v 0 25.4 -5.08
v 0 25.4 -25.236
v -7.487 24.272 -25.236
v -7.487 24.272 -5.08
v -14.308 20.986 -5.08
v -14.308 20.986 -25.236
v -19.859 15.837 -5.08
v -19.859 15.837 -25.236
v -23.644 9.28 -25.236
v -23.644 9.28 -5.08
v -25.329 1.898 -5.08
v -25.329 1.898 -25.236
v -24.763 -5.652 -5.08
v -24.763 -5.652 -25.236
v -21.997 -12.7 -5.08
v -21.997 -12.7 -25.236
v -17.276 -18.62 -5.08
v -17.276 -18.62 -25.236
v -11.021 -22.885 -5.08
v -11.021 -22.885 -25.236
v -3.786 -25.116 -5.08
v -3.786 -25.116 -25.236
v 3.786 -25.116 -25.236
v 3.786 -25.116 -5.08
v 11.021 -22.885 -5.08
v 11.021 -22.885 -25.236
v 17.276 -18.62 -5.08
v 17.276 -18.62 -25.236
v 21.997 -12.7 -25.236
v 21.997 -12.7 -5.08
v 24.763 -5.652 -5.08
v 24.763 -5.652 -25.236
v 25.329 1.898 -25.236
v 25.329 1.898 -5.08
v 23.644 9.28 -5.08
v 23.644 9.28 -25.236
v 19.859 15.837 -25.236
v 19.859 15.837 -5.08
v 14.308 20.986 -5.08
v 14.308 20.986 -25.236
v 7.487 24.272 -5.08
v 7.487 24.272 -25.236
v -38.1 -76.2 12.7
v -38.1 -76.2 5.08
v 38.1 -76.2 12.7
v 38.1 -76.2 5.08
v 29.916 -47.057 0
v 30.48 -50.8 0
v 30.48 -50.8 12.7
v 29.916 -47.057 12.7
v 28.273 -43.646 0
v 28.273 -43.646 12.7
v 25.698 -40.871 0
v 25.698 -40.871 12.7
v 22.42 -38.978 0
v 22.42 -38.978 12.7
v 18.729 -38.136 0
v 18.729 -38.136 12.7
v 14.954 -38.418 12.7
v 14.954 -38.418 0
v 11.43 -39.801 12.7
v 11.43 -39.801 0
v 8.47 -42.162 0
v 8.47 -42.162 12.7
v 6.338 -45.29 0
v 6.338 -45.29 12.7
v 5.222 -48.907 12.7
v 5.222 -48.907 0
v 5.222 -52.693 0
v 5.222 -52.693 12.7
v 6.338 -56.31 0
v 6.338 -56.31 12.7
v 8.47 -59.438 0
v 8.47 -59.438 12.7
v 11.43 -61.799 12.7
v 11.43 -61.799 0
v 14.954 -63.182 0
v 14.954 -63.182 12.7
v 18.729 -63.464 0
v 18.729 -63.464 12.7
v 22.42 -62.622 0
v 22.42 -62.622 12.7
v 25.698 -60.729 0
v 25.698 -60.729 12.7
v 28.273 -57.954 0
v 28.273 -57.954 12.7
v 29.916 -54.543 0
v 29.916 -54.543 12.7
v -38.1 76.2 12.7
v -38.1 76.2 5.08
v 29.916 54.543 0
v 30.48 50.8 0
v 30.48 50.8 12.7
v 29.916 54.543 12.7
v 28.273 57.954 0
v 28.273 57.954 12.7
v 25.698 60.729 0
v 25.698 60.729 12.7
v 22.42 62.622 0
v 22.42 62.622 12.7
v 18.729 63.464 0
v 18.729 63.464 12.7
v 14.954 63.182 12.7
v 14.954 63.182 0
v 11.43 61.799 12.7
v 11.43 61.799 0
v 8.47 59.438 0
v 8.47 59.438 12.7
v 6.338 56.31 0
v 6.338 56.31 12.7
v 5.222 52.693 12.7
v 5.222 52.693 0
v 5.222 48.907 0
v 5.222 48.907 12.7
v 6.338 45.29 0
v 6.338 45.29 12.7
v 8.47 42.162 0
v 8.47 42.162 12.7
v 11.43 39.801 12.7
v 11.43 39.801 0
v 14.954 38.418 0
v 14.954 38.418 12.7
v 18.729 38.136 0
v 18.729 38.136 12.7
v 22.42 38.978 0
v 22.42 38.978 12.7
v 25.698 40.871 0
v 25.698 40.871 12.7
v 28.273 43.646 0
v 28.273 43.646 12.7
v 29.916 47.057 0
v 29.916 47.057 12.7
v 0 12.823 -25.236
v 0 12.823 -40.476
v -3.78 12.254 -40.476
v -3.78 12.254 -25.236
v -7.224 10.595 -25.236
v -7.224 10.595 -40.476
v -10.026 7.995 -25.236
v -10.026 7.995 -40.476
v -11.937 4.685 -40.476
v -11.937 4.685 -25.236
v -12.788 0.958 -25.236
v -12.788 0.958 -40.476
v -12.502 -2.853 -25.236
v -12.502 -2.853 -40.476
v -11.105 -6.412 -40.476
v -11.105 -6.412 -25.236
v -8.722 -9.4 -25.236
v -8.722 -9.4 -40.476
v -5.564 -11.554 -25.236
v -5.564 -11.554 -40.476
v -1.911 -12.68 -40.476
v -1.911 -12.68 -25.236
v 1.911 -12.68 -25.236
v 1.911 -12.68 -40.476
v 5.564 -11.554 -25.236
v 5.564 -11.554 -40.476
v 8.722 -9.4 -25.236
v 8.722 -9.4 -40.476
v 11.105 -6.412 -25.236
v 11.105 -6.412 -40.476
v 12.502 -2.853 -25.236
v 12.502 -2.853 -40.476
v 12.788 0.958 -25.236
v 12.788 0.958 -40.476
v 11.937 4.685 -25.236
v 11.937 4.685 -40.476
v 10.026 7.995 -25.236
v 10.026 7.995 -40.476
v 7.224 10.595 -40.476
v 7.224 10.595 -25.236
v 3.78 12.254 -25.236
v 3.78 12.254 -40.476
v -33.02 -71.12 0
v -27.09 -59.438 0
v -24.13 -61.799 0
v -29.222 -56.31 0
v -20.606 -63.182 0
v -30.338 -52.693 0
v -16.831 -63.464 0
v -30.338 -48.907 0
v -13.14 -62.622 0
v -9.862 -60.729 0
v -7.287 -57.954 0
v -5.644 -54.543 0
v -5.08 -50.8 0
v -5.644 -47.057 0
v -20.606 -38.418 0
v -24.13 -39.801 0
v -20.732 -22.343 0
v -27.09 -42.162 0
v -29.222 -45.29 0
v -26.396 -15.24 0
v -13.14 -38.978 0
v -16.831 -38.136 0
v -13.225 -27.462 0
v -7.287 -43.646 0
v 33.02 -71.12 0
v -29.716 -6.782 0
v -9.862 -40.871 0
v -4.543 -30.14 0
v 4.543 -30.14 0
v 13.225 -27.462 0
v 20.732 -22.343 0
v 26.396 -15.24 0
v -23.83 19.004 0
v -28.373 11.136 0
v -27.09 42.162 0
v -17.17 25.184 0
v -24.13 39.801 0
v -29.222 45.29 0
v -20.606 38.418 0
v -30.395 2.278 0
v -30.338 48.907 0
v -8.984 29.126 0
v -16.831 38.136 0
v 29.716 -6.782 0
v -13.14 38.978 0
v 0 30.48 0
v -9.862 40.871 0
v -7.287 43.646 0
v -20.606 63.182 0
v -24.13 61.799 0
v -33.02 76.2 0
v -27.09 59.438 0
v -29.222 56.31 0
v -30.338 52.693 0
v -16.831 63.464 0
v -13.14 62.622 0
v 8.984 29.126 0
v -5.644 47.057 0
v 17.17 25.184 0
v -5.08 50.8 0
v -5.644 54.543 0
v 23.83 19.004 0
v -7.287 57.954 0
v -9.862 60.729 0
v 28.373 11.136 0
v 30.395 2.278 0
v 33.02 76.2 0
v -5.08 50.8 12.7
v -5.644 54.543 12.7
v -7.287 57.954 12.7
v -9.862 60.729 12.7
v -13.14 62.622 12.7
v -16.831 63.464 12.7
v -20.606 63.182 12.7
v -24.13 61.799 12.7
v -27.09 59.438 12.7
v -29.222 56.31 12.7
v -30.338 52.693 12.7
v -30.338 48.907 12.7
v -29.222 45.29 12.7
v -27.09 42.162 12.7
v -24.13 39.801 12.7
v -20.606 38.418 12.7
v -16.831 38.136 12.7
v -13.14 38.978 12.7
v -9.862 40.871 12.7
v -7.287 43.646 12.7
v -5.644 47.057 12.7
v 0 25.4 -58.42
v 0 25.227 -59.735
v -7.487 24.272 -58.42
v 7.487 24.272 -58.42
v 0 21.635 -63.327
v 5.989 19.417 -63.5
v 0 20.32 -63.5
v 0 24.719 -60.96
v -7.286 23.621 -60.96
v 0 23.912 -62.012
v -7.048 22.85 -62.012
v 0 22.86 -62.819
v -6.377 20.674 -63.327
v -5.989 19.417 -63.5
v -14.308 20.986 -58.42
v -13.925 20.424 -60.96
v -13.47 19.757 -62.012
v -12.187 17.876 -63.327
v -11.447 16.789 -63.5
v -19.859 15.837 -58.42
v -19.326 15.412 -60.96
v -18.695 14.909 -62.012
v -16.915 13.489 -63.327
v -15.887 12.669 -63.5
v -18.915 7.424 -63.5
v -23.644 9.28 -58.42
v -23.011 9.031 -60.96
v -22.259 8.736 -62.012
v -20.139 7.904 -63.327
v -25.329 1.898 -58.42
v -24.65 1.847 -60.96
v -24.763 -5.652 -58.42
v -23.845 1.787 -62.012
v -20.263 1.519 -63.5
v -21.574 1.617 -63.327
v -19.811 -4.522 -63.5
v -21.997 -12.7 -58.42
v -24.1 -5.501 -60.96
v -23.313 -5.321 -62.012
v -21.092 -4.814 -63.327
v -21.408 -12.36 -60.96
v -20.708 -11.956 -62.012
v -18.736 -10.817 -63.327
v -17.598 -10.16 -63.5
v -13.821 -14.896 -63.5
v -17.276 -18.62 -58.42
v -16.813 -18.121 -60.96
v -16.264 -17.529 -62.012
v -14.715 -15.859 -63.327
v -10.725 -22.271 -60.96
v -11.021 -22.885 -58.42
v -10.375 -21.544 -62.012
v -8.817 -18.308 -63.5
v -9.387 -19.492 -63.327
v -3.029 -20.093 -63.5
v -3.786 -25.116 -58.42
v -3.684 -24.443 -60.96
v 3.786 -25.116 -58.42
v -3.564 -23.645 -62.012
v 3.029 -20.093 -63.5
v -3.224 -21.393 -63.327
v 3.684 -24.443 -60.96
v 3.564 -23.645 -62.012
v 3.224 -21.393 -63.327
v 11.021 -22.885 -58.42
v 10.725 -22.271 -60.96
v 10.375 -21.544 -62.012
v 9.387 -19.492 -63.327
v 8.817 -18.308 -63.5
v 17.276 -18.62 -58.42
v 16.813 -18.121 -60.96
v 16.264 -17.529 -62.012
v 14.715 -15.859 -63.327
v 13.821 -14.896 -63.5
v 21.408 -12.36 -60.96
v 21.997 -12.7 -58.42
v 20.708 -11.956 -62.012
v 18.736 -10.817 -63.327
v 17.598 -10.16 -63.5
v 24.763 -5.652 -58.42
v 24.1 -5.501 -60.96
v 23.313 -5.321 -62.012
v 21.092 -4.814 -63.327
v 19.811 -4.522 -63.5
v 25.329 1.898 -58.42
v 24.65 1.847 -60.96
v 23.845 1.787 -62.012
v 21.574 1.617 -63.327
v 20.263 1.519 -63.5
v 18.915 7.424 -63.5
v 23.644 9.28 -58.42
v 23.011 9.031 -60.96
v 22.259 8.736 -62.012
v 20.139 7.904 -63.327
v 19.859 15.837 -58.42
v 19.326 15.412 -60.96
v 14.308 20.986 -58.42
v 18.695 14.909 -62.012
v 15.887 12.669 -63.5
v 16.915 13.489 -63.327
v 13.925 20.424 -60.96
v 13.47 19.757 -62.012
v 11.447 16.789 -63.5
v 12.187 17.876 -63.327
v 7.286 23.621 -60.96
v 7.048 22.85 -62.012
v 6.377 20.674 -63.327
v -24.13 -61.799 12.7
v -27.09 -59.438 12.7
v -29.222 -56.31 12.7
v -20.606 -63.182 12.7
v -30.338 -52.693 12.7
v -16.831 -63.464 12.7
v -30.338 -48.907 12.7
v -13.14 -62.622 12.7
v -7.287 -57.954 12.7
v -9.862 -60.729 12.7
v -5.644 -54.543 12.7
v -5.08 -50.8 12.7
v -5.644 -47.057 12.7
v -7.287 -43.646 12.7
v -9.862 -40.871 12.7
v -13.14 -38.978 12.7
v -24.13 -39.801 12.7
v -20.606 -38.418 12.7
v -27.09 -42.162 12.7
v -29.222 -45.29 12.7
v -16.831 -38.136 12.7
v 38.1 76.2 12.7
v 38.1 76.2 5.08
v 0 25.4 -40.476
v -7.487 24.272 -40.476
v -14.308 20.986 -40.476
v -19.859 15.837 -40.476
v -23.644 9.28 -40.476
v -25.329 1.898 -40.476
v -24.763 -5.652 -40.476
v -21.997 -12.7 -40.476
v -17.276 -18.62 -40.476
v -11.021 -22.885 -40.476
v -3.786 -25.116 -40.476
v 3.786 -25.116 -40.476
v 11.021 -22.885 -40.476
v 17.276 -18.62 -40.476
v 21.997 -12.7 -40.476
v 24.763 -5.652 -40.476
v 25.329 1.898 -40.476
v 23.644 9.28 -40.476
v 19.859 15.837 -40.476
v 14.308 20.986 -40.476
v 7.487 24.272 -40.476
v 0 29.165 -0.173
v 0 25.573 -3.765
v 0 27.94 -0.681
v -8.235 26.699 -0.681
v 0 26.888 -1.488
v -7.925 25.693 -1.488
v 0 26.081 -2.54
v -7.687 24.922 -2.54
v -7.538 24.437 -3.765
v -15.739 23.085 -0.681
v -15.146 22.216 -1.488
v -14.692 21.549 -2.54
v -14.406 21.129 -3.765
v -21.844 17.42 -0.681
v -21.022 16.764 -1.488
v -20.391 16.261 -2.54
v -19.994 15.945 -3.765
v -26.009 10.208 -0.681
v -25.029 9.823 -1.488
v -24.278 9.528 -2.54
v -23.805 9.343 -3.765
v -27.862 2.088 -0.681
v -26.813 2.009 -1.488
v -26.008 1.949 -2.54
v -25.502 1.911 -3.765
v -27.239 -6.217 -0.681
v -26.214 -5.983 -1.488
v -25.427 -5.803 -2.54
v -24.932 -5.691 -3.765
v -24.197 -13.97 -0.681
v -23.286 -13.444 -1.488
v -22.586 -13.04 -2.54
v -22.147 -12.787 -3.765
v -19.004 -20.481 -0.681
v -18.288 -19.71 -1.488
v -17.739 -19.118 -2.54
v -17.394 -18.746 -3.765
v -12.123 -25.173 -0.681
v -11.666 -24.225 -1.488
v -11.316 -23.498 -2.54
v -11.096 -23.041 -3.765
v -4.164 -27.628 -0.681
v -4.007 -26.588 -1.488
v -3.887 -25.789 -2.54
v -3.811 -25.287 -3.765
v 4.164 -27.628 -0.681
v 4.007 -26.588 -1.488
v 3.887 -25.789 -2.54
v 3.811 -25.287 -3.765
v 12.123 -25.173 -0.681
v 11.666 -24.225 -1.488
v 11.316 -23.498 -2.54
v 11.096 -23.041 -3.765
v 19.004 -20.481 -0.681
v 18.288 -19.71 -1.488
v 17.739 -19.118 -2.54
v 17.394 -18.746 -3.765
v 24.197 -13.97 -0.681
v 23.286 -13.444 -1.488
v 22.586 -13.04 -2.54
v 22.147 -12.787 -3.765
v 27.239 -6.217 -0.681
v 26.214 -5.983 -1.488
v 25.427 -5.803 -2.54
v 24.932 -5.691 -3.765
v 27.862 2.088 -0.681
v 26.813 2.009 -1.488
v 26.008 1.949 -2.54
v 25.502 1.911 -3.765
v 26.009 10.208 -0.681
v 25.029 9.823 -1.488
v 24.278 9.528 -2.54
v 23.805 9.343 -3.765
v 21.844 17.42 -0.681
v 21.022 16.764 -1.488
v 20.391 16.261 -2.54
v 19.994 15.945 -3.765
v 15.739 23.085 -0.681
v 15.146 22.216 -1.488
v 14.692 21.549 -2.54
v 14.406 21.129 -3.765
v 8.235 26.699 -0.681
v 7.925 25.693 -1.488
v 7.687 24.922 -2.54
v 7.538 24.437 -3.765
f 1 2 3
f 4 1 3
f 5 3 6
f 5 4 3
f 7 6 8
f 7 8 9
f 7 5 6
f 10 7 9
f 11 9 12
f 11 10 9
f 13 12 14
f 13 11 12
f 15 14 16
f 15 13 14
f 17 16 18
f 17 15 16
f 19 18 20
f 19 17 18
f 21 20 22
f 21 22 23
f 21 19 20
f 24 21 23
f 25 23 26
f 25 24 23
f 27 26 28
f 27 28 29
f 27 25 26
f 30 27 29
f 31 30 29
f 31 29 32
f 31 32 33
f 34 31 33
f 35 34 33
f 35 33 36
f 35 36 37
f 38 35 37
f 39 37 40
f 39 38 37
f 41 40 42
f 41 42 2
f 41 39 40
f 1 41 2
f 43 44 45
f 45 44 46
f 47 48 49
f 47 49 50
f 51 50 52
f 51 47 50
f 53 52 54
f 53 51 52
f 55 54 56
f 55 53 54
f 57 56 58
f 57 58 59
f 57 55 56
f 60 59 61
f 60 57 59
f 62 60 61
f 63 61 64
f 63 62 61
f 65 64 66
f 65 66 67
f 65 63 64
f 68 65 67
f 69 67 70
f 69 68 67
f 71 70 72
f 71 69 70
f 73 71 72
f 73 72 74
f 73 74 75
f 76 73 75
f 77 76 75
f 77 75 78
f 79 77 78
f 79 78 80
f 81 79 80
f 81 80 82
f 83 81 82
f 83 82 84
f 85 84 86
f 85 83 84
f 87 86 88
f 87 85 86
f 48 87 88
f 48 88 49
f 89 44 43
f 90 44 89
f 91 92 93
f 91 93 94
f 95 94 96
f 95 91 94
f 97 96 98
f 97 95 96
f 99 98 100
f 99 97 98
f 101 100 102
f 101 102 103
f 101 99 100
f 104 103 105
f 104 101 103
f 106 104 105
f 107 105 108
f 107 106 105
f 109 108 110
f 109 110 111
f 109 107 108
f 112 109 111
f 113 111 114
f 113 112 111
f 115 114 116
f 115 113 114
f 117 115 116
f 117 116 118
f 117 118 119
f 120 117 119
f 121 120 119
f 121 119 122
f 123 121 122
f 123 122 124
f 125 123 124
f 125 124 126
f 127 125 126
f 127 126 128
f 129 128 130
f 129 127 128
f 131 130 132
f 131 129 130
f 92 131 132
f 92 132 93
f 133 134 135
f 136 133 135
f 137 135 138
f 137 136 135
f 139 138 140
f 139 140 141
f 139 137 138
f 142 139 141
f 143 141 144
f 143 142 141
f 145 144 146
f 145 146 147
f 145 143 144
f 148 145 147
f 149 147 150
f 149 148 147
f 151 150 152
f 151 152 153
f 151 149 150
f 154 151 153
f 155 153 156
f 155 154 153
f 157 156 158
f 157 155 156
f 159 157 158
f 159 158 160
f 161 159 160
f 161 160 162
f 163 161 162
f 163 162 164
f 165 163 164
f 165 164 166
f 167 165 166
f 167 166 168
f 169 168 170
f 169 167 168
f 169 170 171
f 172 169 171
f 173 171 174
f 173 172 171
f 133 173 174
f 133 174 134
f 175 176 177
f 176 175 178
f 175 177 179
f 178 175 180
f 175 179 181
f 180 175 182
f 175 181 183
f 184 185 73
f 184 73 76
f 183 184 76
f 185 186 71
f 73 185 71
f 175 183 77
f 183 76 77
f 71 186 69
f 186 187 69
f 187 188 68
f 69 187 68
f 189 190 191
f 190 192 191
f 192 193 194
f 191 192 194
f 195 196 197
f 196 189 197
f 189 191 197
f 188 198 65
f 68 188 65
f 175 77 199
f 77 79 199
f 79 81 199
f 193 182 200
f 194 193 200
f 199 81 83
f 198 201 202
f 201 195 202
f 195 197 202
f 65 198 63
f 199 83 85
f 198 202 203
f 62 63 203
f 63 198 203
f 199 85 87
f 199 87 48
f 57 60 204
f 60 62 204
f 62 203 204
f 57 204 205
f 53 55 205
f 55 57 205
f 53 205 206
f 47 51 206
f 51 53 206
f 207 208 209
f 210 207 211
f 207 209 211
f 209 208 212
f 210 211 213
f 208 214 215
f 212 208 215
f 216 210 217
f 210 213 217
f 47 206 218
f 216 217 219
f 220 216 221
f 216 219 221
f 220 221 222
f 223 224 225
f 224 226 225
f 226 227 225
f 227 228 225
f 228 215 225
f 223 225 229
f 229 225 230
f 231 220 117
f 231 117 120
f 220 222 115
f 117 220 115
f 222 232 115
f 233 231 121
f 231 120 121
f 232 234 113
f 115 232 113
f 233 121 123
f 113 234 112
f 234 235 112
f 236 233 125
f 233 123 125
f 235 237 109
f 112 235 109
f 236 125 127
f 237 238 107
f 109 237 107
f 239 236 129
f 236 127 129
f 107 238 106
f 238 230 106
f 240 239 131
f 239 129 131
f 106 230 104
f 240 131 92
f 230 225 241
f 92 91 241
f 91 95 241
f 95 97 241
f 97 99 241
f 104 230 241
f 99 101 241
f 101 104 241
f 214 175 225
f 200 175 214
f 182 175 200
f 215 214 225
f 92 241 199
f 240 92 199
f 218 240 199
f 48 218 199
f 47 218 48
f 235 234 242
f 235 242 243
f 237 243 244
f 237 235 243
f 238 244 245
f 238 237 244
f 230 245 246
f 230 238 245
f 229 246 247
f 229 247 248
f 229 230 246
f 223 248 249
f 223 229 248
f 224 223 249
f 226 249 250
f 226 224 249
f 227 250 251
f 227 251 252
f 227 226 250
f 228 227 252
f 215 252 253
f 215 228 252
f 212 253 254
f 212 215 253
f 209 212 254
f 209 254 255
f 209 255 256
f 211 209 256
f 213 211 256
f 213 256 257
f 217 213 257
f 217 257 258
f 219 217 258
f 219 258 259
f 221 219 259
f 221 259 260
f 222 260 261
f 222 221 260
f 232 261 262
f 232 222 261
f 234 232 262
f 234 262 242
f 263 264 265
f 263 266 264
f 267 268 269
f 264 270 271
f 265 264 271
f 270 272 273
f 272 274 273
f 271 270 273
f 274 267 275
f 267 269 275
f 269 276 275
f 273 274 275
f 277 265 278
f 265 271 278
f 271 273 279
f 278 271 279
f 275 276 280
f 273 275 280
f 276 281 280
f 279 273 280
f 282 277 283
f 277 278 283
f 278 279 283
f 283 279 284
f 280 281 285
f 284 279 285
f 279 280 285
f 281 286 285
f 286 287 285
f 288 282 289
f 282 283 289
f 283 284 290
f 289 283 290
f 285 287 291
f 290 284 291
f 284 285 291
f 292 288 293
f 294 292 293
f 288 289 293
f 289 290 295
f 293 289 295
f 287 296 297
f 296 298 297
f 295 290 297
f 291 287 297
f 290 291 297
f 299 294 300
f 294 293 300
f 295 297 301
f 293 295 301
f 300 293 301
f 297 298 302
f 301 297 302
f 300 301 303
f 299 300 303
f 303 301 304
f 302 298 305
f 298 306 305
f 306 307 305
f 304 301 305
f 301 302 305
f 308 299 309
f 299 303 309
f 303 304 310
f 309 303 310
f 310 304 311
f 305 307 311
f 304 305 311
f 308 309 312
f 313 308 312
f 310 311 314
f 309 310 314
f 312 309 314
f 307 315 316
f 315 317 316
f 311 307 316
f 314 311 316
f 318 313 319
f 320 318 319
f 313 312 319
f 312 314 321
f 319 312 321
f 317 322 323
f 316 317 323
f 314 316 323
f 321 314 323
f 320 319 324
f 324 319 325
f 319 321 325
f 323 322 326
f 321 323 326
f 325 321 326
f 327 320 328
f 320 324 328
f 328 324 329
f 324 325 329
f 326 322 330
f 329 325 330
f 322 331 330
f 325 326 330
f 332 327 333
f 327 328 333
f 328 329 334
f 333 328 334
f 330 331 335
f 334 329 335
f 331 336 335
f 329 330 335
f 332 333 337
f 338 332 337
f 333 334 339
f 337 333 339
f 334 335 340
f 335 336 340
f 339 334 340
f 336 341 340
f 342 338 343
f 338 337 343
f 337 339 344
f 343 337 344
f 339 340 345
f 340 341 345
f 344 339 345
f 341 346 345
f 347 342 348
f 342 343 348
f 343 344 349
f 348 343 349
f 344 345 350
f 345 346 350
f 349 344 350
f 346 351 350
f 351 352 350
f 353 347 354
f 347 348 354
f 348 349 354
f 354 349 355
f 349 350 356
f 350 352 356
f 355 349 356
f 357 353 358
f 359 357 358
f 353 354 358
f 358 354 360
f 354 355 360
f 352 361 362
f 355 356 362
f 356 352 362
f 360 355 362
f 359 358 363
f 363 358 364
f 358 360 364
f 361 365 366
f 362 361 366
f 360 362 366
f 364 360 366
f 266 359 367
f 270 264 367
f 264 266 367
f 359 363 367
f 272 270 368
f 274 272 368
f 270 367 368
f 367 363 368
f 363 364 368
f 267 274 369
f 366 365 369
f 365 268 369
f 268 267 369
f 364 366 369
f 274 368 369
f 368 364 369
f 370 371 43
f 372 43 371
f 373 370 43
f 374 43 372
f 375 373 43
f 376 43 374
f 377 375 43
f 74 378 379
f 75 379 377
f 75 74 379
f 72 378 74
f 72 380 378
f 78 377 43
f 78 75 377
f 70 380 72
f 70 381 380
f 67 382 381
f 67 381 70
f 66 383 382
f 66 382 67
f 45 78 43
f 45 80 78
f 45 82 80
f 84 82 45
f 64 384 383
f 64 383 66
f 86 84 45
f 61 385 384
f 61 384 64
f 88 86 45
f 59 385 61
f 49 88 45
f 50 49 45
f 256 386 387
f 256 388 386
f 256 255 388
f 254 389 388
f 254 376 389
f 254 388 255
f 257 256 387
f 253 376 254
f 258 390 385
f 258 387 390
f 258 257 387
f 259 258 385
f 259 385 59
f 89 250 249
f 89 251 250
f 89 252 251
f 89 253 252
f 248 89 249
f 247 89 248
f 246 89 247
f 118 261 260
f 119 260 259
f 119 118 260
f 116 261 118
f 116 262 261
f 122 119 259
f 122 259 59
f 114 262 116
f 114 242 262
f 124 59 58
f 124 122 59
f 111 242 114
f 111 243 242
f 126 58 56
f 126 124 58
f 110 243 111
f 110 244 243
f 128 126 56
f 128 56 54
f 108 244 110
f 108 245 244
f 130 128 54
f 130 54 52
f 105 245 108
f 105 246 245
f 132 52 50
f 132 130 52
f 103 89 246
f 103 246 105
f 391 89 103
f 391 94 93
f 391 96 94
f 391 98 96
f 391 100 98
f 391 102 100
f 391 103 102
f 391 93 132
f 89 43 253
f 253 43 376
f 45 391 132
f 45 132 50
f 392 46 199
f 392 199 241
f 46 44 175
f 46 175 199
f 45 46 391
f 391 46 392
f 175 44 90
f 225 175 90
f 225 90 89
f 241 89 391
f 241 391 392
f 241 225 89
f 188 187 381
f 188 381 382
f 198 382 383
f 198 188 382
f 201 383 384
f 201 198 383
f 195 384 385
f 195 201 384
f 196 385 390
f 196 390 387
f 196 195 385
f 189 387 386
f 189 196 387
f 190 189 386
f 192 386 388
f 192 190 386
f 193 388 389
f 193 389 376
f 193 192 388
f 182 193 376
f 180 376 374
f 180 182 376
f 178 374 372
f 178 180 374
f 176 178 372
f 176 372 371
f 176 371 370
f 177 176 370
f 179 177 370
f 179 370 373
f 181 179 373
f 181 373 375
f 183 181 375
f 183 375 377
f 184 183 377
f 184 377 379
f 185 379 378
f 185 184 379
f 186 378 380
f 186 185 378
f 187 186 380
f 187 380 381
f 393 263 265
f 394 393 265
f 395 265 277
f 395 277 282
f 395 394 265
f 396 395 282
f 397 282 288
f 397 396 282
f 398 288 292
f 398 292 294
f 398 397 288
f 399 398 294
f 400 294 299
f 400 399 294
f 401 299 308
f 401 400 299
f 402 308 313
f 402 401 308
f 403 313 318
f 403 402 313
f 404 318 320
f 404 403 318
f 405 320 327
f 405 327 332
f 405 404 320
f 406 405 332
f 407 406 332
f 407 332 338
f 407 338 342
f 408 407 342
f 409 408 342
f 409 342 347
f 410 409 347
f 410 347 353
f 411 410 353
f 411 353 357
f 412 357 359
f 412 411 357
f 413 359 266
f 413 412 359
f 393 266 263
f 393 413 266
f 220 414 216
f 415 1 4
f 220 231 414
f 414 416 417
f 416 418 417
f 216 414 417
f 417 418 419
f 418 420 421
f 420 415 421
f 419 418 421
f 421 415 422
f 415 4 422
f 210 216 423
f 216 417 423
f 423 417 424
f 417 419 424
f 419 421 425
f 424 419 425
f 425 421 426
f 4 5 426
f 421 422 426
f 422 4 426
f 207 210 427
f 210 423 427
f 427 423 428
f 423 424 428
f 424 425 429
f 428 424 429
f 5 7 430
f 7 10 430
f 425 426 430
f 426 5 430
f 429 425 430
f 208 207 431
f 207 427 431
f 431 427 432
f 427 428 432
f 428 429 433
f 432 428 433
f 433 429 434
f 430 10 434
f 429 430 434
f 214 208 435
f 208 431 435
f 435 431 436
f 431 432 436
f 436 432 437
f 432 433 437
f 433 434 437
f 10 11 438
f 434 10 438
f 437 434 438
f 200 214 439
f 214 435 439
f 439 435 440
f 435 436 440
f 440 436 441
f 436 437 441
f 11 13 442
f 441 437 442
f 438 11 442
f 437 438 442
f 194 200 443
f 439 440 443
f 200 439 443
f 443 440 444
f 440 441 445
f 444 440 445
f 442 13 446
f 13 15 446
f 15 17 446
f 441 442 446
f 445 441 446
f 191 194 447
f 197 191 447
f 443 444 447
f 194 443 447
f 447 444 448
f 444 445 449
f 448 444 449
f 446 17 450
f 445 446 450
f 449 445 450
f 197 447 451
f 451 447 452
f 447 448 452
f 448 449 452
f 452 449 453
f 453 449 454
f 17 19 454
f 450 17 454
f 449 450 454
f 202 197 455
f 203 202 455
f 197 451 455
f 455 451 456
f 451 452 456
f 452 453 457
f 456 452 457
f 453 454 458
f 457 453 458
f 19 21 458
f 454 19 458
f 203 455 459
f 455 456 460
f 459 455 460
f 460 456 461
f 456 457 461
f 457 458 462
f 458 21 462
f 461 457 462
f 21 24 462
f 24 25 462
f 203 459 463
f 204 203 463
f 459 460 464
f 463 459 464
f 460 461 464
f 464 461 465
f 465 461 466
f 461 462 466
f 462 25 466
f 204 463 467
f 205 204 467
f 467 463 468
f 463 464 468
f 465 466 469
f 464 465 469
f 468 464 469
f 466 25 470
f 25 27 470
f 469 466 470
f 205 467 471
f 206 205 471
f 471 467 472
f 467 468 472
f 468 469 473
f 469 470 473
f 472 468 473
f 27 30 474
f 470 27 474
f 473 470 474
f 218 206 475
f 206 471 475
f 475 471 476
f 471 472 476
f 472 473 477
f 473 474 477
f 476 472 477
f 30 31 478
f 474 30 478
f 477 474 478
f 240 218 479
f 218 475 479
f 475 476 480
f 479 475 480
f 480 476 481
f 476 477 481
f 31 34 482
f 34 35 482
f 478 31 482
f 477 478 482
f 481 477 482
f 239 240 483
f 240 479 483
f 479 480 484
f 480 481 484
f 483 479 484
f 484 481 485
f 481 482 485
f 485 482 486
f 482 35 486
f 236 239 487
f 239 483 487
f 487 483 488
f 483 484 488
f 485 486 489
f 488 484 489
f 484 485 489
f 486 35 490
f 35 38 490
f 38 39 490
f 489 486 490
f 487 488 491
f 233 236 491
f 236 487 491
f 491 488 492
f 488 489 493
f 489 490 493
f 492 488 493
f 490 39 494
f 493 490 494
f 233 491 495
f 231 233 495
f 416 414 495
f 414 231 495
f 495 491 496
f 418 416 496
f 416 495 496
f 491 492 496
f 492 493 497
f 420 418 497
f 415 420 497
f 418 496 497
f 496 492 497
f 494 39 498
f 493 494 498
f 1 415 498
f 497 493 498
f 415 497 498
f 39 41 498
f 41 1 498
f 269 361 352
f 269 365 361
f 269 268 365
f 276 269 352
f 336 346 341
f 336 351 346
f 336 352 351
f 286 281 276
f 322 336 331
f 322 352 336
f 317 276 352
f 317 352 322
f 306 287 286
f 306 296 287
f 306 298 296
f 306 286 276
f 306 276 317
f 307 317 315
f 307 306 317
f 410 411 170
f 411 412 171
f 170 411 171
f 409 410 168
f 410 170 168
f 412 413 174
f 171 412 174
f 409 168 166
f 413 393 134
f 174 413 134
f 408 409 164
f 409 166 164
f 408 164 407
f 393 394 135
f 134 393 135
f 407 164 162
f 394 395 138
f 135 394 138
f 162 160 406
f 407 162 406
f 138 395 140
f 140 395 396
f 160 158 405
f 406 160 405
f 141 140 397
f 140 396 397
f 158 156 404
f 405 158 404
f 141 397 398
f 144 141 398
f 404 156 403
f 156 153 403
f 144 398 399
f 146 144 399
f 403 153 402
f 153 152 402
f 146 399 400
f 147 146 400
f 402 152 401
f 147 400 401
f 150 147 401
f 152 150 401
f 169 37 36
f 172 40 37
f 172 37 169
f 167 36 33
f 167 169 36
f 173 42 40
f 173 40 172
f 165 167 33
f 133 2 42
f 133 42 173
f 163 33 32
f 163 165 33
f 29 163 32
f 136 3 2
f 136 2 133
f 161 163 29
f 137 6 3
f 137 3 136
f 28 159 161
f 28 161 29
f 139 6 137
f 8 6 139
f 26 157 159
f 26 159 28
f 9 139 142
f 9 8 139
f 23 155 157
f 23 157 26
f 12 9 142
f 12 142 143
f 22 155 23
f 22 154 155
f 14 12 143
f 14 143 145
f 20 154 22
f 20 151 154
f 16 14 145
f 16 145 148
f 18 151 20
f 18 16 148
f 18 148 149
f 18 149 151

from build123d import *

# Parameters (mm, degrees)
F0_W     = 76.2
F0_H     = 152.4
F1_DEPTH = 12.7
F2_R     = 12.7
F3_DEPTH = 12.7
F4_W     = 25.4
F4_H     = 63.5
F6_W     = 17.78
F6_H     = 15.24
F8_R     = 5.08
F9_SIZE  = 5.08


with BuildPart() as f1:
    # F0 (on Top) → F1 (new body)
    with BuildSketch(Plane.XY):
        Rectangle(F0_W, F0_H)
    extrude(amount=F1_DEPTH)

    # F2 (on Top) → F3 (cut, through all)
    with BuildSketch(Plane.XY):
        with Locations((-17.78, 50.8)):
            Circle(F2_R)
        with Locations((17.78, 50.8)):
            Circle(F2_R)
        with Locations((-17.78, -50.8)):
            Circle(F2_R)
        with Locations((17.78, -50.8)):
            Circle(F2_R)
    extrude(amount=F3_DEPTH, mode=Mode.SUBTRACT)

    # F4 (on Right) → F5 (revolve)
    with BuildSketch(Plane.YZ):
        with Locations((12.7, -31.75)):
            Rectangle(F4_W, F4_H)
    revolve(axis=Axis((0, 0, -31.75), (0, 0, 1)))

    # F6 (on Right) → F7 (revolve, cut)
    with BuildSketch(Plane.YZ):
        with Locations((21.713463, -32.855657)):
            Rectangle(F6_W, F6_H)
    revolve(axis=Axis((0, 0, -63.5), (0, 0, 1)), mode=Mode.SUBTRACT)

    # F8
    f8_edges = [f1.edges().sort_by_distance(p)[0] for p in [
        (0, -25.4, -63.5),
        (0, -25.4, 0),
    ]]
    fillet(f8_edges, radius=F8_R)

    # F9
    f9_edges = [f1.edges().sort_by_distance(p)[0] for p in [
        (-38.1, 0, 0),
        (0, -76.2, 0),
        (38.1, 0, 0),
    ]]
    chamfer(f9_edges, length=F9_SIZE)


solid = f1.part
